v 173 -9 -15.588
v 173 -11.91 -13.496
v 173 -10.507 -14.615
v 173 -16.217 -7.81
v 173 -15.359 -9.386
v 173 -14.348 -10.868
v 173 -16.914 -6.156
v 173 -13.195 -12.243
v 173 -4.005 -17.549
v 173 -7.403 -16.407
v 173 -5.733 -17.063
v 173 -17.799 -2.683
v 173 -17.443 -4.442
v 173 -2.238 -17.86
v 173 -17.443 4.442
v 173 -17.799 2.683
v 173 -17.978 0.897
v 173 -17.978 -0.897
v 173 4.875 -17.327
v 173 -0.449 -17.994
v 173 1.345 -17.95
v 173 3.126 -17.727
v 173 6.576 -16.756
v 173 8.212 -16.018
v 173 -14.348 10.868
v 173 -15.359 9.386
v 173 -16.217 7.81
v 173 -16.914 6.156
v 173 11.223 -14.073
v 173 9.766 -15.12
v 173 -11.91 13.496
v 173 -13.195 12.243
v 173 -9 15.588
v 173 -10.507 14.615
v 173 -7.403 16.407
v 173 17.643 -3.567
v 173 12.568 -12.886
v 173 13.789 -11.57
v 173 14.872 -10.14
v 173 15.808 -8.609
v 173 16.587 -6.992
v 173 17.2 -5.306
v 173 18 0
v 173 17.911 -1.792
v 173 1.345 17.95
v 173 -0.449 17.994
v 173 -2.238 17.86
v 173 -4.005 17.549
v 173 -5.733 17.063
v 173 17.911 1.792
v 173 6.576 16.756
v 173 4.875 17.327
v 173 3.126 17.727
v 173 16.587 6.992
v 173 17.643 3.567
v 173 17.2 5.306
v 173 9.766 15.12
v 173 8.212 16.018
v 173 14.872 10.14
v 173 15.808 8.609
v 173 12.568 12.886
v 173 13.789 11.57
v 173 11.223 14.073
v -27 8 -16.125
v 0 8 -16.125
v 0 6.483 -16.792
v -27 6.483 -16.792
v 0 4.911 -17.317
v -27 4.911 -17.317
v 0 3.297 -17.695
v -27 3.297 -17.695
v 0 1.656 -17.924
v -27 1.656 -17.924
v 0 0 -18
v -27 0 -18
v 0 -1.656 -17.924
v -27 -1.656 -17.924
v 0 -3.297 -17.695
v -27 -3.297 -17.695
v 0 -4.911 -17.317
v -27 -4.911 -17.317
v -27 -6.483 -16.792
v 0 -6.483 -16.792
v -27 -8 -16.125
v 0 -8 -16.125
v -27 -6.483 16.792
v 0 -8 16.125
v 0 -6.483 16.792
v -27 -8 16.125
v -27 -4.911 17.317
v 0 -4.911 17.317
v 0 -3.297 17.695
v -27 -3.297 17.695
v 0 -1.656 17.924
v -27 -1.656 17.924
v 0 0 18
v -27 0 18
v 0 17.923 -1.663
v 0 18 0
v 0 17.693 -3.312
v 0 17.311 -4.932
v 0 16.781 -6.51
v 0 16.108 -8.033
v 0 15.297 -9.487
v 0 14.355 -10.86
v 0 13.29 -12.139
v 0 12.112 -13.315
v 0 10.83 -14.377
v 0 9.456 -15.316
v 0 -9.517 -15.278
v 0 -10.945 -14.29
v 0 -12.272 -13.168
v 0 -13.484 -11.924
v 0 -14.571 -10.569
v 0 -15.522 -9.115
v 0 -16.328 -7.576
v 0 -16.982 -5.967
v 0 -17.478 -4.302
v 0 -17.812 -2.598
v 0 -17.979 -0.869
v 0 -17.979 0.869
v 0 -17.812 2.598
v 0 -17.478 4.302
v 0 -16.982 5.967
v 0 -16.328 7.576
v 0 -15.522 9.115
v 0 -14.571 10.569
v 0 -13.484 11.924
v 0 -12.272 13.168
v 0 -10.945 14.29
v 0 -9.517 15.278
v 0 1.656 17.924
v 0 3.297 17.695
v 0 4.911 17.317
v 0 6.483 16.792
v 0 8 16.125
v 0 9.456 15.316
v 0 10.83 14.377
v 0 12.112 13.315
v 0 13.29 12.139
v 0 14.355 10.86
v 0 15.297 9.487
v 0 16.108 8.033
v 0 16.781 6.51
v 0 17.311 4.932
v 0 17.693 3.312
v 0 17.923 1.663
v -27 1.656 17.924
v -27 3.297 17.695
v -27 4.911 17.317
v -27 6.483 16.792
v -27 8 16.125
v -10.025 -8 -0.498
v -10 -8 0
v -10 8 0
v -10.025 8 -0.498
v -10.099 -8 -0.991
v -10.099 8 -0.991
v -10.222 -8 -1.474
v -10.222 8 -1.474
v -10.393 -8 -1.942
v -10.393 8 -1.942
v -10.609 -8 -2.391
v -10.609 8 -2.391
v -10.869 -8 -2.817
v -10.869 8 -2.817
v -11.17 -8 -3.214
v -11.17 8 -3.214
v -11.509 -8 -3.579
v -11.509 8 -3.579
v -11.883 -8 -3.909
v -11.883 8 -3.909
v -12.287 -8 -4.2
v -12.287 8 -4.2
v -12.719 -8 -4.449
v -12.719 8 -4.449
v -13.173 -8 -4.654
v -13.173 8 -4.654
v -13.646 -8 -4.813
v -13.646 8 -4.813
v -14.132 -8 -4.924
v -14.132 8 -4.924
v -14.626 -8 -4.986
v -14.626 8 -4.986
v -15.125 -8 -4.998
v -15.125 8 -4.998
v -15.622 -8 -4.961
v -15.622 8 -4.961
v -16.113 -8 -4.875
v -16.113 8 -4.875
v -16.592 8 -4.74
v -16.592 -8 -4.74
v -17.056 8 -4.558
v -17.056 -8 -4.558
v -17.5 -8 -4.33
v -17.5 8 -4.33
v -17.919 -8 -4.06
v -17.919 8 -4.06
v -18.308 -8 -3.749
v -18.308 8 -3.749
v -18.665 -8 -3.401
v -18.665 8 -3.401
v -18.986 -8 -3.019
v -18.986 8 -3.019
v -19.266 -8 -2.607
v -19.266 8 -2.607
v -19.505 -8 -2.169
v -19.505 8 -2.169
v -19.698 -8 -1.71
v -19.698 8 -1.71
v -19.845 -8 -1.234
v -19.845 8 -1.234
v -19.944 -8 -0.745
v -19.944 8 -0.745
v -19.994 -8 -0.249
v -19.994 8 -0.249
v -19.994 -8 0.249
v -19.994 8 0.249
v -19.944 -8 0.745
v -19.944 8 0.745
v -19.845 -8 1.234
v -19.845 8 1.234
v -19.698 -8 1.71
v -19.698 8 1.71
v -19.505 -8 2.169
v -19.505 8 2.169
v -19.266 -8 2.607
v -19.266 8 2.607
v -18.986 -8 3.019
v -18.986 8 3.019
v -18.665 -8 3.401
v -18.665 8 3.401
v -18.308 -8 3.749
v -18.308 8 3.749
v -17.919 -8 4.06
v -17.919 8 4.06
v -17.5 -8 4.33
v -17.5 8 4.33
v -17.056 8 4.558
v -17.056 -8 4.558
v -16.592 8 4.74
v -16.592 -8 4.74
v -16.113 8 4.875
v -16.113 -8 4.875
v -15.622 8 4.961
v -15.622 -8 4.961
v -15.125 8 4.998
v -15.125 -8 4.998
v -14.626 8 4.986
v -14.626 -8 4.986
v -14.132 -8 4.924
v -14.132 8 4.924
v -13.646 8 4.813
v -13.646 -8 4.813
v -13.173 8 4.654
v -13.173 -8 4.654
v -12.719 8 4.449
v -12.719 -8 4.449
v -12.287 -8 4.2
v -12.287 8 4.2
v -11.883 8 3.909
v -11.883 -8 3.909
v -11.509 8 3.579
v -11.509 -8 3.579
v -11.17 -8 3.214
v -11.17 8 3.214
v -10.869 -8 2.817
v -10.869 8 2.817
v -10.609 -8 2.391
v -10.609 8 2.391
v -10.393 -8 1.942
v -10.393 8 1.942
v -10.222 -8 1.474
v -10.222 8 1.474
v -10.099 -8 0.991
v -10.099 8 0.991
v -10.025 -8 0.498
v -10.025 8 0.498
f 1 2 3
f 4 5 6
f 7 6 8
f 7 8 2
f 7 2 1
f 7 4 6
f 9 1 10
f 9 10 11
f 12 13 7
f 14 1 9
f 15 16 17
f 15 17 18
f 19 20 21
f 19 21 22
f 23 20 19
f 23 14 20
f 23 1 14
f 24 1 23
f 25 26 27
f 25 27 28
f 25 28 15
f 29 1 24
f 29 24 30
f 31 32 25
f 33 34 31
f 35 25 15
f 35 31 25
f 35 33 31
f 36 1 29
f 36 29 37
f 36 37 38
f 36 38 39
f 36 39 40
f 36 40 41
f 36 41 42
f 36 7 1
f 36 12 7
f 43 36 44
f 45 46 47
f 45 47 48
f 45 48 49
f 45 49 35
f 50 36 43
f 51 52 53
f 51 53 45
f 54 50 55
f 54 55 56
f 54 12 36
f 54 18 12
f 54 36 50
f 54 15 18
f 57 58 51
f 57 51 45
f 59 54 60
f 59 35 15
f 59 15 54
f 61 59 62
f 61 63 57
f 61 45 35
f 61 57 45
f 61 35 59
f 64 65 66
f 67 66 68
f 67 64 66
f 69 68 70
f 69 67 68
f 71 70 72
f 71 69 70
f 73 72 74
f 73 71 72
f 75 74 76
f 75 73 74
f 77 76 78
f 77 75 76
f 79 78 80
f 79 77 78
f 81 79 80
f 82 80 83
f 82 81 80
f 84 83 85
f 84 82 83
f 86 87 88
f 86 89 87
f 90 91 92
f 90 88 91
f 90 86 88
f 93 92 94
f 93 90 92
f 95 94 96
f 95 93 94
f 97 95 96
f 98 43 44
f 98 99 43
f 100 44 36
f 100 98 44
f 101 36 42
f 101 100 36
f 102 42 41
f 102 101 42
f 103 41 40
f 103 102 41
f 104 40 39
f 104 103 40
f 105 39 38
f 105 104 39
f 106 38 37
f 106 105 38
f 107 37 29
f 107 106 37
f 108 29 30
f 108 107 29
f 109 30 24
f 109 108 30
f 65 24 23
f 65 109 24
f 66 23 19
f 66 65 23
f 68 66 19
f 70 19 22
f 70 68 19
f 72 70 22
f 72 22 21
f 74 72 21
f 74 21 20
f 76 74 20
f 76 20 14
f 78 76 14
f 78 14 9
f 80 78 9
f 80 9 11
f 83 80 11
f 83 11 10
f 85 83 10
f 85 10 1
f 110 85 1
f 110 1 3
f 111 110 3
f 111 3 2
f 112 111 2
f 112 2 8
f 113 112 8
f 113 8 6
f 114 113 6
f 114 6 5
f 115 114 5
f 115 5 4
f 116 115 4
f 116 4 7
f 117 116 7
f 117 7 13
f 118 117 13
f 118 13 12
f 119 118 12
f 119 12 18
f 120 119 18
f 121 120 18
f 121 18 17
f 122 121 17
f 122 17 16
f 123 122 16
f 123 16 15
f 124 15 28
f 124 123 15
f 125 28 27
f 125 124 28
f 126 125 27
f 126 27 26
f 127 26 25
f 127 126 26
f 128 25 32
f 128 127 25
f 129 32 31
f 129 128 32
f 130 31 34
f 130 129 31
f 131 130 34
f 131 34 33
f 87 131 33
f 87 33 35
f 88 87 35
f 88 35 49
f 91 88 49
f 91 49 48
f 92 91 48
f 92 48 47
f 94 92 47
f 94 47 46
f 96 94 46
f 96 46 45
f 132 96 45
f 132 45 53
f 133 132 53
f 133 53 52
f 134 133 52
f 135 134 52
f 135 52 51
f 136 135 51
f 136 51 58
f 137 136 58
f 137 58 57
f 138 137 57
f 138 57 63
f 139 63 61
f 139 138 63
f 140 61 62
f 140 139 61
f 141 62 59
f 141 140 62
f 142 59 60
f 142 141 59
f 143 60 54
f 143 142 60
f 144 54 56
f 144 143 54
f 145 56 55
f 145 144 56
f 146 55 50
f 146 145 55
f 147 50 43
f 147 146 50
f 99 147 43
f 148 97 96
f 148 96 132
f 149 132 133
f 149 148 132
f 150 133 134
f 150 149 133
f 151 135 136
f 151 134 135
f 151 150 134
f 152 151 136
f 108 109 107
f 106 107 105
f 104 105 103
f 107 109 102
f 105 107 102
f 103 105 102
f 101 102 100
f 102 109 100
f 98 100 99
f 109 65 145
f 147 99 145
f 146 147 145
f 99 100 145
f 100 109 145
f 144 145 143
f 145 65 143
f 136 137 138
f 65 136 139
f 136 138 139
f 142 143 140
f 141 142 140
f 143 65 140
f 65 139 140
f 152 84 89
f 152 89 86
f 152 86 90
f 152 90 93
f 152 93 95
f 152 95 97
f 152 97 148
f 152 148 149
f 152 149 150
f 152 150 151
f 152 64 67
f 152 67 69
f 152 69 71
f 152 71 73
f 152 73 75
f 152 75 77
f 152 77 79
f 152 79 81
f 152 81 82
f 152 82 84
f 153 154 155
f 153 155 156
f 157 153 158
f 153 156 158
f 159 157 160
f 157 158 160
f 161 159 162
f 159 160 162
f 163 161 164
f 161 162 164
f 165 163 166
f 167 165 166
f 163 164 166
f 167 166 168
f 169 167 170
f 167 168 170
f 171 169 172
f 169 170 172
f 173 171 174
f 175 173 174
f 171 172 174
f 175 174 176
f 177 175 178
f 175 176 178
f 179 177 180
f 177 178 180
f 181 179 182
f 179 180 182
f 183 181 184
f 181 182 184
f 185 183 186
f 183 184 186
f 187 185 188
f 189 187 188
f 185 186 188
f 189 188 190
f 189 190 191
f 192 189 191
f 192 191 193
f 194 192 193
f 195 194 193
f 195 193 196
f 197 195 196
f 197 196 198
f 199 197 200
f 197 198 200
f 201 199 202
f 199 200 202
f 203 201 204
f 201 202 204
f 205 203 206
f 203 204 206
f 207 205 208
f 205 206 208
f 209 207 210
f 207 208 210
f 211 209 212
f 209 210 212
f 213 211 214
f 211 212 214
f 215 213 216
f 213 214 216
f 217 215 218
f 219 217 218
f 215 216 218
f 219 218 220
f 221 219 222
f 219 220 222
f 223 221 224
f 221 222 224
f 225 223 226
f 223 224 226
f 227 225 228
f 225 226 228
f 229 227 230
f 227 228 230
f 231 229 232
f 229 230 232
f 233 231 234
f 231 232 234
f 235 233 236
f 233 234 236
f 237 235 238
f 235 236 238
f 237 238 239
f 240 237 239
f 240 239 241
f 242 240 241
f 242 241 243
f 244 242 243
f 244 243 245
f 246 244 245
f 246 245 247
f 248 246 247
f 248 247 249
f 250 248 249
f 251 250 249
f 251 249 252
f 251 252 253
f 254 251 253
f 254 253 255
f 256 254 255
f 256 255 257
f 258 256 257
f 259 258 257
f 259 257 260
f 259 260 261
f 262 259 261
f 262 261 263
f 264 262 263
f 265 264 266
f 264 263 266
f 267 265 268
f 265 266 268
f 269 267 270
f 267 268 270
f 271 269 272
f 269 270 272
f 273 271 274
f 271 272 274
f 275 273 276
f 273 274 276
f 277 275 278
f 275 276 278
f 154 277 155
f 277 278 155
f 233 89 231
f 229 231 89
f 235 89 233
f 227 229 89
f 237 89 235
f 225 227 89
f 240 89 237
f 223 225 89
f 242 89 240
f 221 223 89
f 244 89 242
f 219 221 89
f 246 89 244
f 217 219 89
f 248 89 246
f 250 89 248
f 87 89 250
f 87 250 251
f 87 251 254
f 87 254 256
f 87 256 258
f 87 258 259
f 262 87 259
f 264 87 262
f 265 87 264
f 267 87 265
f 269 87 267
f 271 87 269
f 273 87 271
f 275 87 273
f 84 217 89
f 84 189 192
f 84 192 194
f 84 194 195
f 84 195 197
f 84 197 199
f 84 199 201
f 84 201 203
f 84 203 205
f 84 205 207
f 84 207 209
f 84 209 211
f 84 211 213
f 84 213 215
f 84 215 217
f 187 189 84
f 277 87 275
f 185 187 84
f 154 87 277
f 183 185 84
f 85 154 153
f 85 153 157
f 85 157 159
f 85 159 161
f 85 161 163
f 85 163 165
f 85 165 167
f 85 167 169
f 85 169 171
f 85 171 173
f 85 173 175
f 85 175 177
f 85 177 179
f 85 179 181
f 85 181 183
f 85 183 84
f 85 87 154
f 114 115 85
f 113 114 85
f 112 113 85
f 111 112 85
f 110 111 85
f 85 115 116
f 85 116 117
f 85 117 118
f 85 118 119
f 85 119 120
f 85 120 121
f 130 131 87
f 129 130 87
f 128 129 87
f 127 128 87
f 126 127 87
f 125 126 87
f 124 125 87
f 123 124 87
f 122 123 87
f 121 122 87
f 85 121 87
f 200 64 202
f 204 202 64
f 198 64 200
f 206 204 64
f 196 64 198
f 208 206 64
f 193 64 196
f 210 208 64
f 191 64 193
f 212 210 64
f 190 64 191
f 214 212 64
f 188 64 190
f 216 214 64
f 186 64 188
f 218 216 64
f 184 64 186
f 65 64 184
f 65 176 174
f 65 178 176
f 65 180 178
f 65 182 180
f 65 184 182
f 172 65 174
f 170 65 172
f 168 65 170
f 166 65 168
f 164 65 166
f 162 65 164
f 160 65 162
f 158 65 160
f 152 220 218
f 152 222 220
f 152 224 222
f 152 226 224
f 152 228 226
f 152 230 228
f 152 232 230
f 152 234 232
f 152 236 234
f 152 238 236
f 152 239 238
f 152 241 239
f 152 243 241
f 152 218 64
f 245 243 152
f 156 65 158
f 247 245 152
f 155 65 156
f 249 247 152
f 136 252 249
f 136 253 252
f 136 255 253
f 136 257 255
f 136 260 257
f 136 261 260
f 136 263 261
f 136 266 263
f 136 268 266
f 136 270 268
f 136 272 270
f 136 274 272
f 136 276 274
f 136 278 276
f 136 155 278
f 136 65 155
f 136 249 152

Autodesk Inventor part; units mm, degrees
ref_plane "YZ Plane" through (0, 0, 0) normal (1, 0, 0) x (0, 1, 0)
ref_plane "XZ Plane" through (0, 0, 0) normal (0, 1, 0) x (-1, 0, 0)
ref_plane "XY Plane" through (0, 0, 0) normal (0, 0, 1) x (1, 0, 0)
sketch "Sketch1" plane through (0, 0, 0) normal (1, 0, 0) x (0, 1, 0)
  circle A0 centre (0, 0) radius 18
  dimension "d0" = 36
extrude "Extrusion1" add sketch "Sketch1" along normal blind 173
sketch "Sketch2" plane through (0, 0, 0) normal (-1, 0, 0) x (0, 0, 1)
  line L0 (20, -8) -> (-20, -8)
  line L1 (-20, -8) -> (-20, 8)
  line L2 (-20, 8) -> (20, 8)
  line L3 (20, 8) -> (20, -8)
  line L4 (20, -8) -> (-20, 8) construction
  line L5 (-20, -8) -> (20, 8) construction
  circle A0 centre (0, 0) radius 18 projected
  arc A1 (-16.1245, -8) -> (-17.098, -5.6266) centre (0, 0) ccw
  dimension "d3" = 40
  dimension "d5" = 16
extrude "Extrusion2" add sketch "Sketch2" along normal blind 27 contours A0 L2 L0 | L0 L1 L2 A0 | A0 L2 L3 L0
sketch "Sketch3" plane through (-27, 0, 0) normal (-1, 0, 0) x (0, 0, 1)
  circle A0 centre (0, 0) radius 18
  circle A1 centre (0, 0) radius 50
  dimension "d8" = 36
  dimension "d9" = 100
extrude "Extrusion3" cut sketch "Sketch3" against normal blind 27
sketch "Sketch4" plane through (0, 8, 16.1245) normal (0, 1, 0) x (1, 0, 0)
  circle A0 centre (-15, 16.1245) radius 5
  line L0 (-27, 0) -> (0, 0) projected
  line L1 (-27, 0) -> (-27, 32.249) projected
  point P0 (0, 16.1245)
  dimension "d12" = 10
  dimension "d13" = 16.1245
  dimension "d14" = 12
extrude "Extrusion4" cut sketch "Sketch4" against normal blind 16
properties part number "MSAL 32 50 Stand In"
